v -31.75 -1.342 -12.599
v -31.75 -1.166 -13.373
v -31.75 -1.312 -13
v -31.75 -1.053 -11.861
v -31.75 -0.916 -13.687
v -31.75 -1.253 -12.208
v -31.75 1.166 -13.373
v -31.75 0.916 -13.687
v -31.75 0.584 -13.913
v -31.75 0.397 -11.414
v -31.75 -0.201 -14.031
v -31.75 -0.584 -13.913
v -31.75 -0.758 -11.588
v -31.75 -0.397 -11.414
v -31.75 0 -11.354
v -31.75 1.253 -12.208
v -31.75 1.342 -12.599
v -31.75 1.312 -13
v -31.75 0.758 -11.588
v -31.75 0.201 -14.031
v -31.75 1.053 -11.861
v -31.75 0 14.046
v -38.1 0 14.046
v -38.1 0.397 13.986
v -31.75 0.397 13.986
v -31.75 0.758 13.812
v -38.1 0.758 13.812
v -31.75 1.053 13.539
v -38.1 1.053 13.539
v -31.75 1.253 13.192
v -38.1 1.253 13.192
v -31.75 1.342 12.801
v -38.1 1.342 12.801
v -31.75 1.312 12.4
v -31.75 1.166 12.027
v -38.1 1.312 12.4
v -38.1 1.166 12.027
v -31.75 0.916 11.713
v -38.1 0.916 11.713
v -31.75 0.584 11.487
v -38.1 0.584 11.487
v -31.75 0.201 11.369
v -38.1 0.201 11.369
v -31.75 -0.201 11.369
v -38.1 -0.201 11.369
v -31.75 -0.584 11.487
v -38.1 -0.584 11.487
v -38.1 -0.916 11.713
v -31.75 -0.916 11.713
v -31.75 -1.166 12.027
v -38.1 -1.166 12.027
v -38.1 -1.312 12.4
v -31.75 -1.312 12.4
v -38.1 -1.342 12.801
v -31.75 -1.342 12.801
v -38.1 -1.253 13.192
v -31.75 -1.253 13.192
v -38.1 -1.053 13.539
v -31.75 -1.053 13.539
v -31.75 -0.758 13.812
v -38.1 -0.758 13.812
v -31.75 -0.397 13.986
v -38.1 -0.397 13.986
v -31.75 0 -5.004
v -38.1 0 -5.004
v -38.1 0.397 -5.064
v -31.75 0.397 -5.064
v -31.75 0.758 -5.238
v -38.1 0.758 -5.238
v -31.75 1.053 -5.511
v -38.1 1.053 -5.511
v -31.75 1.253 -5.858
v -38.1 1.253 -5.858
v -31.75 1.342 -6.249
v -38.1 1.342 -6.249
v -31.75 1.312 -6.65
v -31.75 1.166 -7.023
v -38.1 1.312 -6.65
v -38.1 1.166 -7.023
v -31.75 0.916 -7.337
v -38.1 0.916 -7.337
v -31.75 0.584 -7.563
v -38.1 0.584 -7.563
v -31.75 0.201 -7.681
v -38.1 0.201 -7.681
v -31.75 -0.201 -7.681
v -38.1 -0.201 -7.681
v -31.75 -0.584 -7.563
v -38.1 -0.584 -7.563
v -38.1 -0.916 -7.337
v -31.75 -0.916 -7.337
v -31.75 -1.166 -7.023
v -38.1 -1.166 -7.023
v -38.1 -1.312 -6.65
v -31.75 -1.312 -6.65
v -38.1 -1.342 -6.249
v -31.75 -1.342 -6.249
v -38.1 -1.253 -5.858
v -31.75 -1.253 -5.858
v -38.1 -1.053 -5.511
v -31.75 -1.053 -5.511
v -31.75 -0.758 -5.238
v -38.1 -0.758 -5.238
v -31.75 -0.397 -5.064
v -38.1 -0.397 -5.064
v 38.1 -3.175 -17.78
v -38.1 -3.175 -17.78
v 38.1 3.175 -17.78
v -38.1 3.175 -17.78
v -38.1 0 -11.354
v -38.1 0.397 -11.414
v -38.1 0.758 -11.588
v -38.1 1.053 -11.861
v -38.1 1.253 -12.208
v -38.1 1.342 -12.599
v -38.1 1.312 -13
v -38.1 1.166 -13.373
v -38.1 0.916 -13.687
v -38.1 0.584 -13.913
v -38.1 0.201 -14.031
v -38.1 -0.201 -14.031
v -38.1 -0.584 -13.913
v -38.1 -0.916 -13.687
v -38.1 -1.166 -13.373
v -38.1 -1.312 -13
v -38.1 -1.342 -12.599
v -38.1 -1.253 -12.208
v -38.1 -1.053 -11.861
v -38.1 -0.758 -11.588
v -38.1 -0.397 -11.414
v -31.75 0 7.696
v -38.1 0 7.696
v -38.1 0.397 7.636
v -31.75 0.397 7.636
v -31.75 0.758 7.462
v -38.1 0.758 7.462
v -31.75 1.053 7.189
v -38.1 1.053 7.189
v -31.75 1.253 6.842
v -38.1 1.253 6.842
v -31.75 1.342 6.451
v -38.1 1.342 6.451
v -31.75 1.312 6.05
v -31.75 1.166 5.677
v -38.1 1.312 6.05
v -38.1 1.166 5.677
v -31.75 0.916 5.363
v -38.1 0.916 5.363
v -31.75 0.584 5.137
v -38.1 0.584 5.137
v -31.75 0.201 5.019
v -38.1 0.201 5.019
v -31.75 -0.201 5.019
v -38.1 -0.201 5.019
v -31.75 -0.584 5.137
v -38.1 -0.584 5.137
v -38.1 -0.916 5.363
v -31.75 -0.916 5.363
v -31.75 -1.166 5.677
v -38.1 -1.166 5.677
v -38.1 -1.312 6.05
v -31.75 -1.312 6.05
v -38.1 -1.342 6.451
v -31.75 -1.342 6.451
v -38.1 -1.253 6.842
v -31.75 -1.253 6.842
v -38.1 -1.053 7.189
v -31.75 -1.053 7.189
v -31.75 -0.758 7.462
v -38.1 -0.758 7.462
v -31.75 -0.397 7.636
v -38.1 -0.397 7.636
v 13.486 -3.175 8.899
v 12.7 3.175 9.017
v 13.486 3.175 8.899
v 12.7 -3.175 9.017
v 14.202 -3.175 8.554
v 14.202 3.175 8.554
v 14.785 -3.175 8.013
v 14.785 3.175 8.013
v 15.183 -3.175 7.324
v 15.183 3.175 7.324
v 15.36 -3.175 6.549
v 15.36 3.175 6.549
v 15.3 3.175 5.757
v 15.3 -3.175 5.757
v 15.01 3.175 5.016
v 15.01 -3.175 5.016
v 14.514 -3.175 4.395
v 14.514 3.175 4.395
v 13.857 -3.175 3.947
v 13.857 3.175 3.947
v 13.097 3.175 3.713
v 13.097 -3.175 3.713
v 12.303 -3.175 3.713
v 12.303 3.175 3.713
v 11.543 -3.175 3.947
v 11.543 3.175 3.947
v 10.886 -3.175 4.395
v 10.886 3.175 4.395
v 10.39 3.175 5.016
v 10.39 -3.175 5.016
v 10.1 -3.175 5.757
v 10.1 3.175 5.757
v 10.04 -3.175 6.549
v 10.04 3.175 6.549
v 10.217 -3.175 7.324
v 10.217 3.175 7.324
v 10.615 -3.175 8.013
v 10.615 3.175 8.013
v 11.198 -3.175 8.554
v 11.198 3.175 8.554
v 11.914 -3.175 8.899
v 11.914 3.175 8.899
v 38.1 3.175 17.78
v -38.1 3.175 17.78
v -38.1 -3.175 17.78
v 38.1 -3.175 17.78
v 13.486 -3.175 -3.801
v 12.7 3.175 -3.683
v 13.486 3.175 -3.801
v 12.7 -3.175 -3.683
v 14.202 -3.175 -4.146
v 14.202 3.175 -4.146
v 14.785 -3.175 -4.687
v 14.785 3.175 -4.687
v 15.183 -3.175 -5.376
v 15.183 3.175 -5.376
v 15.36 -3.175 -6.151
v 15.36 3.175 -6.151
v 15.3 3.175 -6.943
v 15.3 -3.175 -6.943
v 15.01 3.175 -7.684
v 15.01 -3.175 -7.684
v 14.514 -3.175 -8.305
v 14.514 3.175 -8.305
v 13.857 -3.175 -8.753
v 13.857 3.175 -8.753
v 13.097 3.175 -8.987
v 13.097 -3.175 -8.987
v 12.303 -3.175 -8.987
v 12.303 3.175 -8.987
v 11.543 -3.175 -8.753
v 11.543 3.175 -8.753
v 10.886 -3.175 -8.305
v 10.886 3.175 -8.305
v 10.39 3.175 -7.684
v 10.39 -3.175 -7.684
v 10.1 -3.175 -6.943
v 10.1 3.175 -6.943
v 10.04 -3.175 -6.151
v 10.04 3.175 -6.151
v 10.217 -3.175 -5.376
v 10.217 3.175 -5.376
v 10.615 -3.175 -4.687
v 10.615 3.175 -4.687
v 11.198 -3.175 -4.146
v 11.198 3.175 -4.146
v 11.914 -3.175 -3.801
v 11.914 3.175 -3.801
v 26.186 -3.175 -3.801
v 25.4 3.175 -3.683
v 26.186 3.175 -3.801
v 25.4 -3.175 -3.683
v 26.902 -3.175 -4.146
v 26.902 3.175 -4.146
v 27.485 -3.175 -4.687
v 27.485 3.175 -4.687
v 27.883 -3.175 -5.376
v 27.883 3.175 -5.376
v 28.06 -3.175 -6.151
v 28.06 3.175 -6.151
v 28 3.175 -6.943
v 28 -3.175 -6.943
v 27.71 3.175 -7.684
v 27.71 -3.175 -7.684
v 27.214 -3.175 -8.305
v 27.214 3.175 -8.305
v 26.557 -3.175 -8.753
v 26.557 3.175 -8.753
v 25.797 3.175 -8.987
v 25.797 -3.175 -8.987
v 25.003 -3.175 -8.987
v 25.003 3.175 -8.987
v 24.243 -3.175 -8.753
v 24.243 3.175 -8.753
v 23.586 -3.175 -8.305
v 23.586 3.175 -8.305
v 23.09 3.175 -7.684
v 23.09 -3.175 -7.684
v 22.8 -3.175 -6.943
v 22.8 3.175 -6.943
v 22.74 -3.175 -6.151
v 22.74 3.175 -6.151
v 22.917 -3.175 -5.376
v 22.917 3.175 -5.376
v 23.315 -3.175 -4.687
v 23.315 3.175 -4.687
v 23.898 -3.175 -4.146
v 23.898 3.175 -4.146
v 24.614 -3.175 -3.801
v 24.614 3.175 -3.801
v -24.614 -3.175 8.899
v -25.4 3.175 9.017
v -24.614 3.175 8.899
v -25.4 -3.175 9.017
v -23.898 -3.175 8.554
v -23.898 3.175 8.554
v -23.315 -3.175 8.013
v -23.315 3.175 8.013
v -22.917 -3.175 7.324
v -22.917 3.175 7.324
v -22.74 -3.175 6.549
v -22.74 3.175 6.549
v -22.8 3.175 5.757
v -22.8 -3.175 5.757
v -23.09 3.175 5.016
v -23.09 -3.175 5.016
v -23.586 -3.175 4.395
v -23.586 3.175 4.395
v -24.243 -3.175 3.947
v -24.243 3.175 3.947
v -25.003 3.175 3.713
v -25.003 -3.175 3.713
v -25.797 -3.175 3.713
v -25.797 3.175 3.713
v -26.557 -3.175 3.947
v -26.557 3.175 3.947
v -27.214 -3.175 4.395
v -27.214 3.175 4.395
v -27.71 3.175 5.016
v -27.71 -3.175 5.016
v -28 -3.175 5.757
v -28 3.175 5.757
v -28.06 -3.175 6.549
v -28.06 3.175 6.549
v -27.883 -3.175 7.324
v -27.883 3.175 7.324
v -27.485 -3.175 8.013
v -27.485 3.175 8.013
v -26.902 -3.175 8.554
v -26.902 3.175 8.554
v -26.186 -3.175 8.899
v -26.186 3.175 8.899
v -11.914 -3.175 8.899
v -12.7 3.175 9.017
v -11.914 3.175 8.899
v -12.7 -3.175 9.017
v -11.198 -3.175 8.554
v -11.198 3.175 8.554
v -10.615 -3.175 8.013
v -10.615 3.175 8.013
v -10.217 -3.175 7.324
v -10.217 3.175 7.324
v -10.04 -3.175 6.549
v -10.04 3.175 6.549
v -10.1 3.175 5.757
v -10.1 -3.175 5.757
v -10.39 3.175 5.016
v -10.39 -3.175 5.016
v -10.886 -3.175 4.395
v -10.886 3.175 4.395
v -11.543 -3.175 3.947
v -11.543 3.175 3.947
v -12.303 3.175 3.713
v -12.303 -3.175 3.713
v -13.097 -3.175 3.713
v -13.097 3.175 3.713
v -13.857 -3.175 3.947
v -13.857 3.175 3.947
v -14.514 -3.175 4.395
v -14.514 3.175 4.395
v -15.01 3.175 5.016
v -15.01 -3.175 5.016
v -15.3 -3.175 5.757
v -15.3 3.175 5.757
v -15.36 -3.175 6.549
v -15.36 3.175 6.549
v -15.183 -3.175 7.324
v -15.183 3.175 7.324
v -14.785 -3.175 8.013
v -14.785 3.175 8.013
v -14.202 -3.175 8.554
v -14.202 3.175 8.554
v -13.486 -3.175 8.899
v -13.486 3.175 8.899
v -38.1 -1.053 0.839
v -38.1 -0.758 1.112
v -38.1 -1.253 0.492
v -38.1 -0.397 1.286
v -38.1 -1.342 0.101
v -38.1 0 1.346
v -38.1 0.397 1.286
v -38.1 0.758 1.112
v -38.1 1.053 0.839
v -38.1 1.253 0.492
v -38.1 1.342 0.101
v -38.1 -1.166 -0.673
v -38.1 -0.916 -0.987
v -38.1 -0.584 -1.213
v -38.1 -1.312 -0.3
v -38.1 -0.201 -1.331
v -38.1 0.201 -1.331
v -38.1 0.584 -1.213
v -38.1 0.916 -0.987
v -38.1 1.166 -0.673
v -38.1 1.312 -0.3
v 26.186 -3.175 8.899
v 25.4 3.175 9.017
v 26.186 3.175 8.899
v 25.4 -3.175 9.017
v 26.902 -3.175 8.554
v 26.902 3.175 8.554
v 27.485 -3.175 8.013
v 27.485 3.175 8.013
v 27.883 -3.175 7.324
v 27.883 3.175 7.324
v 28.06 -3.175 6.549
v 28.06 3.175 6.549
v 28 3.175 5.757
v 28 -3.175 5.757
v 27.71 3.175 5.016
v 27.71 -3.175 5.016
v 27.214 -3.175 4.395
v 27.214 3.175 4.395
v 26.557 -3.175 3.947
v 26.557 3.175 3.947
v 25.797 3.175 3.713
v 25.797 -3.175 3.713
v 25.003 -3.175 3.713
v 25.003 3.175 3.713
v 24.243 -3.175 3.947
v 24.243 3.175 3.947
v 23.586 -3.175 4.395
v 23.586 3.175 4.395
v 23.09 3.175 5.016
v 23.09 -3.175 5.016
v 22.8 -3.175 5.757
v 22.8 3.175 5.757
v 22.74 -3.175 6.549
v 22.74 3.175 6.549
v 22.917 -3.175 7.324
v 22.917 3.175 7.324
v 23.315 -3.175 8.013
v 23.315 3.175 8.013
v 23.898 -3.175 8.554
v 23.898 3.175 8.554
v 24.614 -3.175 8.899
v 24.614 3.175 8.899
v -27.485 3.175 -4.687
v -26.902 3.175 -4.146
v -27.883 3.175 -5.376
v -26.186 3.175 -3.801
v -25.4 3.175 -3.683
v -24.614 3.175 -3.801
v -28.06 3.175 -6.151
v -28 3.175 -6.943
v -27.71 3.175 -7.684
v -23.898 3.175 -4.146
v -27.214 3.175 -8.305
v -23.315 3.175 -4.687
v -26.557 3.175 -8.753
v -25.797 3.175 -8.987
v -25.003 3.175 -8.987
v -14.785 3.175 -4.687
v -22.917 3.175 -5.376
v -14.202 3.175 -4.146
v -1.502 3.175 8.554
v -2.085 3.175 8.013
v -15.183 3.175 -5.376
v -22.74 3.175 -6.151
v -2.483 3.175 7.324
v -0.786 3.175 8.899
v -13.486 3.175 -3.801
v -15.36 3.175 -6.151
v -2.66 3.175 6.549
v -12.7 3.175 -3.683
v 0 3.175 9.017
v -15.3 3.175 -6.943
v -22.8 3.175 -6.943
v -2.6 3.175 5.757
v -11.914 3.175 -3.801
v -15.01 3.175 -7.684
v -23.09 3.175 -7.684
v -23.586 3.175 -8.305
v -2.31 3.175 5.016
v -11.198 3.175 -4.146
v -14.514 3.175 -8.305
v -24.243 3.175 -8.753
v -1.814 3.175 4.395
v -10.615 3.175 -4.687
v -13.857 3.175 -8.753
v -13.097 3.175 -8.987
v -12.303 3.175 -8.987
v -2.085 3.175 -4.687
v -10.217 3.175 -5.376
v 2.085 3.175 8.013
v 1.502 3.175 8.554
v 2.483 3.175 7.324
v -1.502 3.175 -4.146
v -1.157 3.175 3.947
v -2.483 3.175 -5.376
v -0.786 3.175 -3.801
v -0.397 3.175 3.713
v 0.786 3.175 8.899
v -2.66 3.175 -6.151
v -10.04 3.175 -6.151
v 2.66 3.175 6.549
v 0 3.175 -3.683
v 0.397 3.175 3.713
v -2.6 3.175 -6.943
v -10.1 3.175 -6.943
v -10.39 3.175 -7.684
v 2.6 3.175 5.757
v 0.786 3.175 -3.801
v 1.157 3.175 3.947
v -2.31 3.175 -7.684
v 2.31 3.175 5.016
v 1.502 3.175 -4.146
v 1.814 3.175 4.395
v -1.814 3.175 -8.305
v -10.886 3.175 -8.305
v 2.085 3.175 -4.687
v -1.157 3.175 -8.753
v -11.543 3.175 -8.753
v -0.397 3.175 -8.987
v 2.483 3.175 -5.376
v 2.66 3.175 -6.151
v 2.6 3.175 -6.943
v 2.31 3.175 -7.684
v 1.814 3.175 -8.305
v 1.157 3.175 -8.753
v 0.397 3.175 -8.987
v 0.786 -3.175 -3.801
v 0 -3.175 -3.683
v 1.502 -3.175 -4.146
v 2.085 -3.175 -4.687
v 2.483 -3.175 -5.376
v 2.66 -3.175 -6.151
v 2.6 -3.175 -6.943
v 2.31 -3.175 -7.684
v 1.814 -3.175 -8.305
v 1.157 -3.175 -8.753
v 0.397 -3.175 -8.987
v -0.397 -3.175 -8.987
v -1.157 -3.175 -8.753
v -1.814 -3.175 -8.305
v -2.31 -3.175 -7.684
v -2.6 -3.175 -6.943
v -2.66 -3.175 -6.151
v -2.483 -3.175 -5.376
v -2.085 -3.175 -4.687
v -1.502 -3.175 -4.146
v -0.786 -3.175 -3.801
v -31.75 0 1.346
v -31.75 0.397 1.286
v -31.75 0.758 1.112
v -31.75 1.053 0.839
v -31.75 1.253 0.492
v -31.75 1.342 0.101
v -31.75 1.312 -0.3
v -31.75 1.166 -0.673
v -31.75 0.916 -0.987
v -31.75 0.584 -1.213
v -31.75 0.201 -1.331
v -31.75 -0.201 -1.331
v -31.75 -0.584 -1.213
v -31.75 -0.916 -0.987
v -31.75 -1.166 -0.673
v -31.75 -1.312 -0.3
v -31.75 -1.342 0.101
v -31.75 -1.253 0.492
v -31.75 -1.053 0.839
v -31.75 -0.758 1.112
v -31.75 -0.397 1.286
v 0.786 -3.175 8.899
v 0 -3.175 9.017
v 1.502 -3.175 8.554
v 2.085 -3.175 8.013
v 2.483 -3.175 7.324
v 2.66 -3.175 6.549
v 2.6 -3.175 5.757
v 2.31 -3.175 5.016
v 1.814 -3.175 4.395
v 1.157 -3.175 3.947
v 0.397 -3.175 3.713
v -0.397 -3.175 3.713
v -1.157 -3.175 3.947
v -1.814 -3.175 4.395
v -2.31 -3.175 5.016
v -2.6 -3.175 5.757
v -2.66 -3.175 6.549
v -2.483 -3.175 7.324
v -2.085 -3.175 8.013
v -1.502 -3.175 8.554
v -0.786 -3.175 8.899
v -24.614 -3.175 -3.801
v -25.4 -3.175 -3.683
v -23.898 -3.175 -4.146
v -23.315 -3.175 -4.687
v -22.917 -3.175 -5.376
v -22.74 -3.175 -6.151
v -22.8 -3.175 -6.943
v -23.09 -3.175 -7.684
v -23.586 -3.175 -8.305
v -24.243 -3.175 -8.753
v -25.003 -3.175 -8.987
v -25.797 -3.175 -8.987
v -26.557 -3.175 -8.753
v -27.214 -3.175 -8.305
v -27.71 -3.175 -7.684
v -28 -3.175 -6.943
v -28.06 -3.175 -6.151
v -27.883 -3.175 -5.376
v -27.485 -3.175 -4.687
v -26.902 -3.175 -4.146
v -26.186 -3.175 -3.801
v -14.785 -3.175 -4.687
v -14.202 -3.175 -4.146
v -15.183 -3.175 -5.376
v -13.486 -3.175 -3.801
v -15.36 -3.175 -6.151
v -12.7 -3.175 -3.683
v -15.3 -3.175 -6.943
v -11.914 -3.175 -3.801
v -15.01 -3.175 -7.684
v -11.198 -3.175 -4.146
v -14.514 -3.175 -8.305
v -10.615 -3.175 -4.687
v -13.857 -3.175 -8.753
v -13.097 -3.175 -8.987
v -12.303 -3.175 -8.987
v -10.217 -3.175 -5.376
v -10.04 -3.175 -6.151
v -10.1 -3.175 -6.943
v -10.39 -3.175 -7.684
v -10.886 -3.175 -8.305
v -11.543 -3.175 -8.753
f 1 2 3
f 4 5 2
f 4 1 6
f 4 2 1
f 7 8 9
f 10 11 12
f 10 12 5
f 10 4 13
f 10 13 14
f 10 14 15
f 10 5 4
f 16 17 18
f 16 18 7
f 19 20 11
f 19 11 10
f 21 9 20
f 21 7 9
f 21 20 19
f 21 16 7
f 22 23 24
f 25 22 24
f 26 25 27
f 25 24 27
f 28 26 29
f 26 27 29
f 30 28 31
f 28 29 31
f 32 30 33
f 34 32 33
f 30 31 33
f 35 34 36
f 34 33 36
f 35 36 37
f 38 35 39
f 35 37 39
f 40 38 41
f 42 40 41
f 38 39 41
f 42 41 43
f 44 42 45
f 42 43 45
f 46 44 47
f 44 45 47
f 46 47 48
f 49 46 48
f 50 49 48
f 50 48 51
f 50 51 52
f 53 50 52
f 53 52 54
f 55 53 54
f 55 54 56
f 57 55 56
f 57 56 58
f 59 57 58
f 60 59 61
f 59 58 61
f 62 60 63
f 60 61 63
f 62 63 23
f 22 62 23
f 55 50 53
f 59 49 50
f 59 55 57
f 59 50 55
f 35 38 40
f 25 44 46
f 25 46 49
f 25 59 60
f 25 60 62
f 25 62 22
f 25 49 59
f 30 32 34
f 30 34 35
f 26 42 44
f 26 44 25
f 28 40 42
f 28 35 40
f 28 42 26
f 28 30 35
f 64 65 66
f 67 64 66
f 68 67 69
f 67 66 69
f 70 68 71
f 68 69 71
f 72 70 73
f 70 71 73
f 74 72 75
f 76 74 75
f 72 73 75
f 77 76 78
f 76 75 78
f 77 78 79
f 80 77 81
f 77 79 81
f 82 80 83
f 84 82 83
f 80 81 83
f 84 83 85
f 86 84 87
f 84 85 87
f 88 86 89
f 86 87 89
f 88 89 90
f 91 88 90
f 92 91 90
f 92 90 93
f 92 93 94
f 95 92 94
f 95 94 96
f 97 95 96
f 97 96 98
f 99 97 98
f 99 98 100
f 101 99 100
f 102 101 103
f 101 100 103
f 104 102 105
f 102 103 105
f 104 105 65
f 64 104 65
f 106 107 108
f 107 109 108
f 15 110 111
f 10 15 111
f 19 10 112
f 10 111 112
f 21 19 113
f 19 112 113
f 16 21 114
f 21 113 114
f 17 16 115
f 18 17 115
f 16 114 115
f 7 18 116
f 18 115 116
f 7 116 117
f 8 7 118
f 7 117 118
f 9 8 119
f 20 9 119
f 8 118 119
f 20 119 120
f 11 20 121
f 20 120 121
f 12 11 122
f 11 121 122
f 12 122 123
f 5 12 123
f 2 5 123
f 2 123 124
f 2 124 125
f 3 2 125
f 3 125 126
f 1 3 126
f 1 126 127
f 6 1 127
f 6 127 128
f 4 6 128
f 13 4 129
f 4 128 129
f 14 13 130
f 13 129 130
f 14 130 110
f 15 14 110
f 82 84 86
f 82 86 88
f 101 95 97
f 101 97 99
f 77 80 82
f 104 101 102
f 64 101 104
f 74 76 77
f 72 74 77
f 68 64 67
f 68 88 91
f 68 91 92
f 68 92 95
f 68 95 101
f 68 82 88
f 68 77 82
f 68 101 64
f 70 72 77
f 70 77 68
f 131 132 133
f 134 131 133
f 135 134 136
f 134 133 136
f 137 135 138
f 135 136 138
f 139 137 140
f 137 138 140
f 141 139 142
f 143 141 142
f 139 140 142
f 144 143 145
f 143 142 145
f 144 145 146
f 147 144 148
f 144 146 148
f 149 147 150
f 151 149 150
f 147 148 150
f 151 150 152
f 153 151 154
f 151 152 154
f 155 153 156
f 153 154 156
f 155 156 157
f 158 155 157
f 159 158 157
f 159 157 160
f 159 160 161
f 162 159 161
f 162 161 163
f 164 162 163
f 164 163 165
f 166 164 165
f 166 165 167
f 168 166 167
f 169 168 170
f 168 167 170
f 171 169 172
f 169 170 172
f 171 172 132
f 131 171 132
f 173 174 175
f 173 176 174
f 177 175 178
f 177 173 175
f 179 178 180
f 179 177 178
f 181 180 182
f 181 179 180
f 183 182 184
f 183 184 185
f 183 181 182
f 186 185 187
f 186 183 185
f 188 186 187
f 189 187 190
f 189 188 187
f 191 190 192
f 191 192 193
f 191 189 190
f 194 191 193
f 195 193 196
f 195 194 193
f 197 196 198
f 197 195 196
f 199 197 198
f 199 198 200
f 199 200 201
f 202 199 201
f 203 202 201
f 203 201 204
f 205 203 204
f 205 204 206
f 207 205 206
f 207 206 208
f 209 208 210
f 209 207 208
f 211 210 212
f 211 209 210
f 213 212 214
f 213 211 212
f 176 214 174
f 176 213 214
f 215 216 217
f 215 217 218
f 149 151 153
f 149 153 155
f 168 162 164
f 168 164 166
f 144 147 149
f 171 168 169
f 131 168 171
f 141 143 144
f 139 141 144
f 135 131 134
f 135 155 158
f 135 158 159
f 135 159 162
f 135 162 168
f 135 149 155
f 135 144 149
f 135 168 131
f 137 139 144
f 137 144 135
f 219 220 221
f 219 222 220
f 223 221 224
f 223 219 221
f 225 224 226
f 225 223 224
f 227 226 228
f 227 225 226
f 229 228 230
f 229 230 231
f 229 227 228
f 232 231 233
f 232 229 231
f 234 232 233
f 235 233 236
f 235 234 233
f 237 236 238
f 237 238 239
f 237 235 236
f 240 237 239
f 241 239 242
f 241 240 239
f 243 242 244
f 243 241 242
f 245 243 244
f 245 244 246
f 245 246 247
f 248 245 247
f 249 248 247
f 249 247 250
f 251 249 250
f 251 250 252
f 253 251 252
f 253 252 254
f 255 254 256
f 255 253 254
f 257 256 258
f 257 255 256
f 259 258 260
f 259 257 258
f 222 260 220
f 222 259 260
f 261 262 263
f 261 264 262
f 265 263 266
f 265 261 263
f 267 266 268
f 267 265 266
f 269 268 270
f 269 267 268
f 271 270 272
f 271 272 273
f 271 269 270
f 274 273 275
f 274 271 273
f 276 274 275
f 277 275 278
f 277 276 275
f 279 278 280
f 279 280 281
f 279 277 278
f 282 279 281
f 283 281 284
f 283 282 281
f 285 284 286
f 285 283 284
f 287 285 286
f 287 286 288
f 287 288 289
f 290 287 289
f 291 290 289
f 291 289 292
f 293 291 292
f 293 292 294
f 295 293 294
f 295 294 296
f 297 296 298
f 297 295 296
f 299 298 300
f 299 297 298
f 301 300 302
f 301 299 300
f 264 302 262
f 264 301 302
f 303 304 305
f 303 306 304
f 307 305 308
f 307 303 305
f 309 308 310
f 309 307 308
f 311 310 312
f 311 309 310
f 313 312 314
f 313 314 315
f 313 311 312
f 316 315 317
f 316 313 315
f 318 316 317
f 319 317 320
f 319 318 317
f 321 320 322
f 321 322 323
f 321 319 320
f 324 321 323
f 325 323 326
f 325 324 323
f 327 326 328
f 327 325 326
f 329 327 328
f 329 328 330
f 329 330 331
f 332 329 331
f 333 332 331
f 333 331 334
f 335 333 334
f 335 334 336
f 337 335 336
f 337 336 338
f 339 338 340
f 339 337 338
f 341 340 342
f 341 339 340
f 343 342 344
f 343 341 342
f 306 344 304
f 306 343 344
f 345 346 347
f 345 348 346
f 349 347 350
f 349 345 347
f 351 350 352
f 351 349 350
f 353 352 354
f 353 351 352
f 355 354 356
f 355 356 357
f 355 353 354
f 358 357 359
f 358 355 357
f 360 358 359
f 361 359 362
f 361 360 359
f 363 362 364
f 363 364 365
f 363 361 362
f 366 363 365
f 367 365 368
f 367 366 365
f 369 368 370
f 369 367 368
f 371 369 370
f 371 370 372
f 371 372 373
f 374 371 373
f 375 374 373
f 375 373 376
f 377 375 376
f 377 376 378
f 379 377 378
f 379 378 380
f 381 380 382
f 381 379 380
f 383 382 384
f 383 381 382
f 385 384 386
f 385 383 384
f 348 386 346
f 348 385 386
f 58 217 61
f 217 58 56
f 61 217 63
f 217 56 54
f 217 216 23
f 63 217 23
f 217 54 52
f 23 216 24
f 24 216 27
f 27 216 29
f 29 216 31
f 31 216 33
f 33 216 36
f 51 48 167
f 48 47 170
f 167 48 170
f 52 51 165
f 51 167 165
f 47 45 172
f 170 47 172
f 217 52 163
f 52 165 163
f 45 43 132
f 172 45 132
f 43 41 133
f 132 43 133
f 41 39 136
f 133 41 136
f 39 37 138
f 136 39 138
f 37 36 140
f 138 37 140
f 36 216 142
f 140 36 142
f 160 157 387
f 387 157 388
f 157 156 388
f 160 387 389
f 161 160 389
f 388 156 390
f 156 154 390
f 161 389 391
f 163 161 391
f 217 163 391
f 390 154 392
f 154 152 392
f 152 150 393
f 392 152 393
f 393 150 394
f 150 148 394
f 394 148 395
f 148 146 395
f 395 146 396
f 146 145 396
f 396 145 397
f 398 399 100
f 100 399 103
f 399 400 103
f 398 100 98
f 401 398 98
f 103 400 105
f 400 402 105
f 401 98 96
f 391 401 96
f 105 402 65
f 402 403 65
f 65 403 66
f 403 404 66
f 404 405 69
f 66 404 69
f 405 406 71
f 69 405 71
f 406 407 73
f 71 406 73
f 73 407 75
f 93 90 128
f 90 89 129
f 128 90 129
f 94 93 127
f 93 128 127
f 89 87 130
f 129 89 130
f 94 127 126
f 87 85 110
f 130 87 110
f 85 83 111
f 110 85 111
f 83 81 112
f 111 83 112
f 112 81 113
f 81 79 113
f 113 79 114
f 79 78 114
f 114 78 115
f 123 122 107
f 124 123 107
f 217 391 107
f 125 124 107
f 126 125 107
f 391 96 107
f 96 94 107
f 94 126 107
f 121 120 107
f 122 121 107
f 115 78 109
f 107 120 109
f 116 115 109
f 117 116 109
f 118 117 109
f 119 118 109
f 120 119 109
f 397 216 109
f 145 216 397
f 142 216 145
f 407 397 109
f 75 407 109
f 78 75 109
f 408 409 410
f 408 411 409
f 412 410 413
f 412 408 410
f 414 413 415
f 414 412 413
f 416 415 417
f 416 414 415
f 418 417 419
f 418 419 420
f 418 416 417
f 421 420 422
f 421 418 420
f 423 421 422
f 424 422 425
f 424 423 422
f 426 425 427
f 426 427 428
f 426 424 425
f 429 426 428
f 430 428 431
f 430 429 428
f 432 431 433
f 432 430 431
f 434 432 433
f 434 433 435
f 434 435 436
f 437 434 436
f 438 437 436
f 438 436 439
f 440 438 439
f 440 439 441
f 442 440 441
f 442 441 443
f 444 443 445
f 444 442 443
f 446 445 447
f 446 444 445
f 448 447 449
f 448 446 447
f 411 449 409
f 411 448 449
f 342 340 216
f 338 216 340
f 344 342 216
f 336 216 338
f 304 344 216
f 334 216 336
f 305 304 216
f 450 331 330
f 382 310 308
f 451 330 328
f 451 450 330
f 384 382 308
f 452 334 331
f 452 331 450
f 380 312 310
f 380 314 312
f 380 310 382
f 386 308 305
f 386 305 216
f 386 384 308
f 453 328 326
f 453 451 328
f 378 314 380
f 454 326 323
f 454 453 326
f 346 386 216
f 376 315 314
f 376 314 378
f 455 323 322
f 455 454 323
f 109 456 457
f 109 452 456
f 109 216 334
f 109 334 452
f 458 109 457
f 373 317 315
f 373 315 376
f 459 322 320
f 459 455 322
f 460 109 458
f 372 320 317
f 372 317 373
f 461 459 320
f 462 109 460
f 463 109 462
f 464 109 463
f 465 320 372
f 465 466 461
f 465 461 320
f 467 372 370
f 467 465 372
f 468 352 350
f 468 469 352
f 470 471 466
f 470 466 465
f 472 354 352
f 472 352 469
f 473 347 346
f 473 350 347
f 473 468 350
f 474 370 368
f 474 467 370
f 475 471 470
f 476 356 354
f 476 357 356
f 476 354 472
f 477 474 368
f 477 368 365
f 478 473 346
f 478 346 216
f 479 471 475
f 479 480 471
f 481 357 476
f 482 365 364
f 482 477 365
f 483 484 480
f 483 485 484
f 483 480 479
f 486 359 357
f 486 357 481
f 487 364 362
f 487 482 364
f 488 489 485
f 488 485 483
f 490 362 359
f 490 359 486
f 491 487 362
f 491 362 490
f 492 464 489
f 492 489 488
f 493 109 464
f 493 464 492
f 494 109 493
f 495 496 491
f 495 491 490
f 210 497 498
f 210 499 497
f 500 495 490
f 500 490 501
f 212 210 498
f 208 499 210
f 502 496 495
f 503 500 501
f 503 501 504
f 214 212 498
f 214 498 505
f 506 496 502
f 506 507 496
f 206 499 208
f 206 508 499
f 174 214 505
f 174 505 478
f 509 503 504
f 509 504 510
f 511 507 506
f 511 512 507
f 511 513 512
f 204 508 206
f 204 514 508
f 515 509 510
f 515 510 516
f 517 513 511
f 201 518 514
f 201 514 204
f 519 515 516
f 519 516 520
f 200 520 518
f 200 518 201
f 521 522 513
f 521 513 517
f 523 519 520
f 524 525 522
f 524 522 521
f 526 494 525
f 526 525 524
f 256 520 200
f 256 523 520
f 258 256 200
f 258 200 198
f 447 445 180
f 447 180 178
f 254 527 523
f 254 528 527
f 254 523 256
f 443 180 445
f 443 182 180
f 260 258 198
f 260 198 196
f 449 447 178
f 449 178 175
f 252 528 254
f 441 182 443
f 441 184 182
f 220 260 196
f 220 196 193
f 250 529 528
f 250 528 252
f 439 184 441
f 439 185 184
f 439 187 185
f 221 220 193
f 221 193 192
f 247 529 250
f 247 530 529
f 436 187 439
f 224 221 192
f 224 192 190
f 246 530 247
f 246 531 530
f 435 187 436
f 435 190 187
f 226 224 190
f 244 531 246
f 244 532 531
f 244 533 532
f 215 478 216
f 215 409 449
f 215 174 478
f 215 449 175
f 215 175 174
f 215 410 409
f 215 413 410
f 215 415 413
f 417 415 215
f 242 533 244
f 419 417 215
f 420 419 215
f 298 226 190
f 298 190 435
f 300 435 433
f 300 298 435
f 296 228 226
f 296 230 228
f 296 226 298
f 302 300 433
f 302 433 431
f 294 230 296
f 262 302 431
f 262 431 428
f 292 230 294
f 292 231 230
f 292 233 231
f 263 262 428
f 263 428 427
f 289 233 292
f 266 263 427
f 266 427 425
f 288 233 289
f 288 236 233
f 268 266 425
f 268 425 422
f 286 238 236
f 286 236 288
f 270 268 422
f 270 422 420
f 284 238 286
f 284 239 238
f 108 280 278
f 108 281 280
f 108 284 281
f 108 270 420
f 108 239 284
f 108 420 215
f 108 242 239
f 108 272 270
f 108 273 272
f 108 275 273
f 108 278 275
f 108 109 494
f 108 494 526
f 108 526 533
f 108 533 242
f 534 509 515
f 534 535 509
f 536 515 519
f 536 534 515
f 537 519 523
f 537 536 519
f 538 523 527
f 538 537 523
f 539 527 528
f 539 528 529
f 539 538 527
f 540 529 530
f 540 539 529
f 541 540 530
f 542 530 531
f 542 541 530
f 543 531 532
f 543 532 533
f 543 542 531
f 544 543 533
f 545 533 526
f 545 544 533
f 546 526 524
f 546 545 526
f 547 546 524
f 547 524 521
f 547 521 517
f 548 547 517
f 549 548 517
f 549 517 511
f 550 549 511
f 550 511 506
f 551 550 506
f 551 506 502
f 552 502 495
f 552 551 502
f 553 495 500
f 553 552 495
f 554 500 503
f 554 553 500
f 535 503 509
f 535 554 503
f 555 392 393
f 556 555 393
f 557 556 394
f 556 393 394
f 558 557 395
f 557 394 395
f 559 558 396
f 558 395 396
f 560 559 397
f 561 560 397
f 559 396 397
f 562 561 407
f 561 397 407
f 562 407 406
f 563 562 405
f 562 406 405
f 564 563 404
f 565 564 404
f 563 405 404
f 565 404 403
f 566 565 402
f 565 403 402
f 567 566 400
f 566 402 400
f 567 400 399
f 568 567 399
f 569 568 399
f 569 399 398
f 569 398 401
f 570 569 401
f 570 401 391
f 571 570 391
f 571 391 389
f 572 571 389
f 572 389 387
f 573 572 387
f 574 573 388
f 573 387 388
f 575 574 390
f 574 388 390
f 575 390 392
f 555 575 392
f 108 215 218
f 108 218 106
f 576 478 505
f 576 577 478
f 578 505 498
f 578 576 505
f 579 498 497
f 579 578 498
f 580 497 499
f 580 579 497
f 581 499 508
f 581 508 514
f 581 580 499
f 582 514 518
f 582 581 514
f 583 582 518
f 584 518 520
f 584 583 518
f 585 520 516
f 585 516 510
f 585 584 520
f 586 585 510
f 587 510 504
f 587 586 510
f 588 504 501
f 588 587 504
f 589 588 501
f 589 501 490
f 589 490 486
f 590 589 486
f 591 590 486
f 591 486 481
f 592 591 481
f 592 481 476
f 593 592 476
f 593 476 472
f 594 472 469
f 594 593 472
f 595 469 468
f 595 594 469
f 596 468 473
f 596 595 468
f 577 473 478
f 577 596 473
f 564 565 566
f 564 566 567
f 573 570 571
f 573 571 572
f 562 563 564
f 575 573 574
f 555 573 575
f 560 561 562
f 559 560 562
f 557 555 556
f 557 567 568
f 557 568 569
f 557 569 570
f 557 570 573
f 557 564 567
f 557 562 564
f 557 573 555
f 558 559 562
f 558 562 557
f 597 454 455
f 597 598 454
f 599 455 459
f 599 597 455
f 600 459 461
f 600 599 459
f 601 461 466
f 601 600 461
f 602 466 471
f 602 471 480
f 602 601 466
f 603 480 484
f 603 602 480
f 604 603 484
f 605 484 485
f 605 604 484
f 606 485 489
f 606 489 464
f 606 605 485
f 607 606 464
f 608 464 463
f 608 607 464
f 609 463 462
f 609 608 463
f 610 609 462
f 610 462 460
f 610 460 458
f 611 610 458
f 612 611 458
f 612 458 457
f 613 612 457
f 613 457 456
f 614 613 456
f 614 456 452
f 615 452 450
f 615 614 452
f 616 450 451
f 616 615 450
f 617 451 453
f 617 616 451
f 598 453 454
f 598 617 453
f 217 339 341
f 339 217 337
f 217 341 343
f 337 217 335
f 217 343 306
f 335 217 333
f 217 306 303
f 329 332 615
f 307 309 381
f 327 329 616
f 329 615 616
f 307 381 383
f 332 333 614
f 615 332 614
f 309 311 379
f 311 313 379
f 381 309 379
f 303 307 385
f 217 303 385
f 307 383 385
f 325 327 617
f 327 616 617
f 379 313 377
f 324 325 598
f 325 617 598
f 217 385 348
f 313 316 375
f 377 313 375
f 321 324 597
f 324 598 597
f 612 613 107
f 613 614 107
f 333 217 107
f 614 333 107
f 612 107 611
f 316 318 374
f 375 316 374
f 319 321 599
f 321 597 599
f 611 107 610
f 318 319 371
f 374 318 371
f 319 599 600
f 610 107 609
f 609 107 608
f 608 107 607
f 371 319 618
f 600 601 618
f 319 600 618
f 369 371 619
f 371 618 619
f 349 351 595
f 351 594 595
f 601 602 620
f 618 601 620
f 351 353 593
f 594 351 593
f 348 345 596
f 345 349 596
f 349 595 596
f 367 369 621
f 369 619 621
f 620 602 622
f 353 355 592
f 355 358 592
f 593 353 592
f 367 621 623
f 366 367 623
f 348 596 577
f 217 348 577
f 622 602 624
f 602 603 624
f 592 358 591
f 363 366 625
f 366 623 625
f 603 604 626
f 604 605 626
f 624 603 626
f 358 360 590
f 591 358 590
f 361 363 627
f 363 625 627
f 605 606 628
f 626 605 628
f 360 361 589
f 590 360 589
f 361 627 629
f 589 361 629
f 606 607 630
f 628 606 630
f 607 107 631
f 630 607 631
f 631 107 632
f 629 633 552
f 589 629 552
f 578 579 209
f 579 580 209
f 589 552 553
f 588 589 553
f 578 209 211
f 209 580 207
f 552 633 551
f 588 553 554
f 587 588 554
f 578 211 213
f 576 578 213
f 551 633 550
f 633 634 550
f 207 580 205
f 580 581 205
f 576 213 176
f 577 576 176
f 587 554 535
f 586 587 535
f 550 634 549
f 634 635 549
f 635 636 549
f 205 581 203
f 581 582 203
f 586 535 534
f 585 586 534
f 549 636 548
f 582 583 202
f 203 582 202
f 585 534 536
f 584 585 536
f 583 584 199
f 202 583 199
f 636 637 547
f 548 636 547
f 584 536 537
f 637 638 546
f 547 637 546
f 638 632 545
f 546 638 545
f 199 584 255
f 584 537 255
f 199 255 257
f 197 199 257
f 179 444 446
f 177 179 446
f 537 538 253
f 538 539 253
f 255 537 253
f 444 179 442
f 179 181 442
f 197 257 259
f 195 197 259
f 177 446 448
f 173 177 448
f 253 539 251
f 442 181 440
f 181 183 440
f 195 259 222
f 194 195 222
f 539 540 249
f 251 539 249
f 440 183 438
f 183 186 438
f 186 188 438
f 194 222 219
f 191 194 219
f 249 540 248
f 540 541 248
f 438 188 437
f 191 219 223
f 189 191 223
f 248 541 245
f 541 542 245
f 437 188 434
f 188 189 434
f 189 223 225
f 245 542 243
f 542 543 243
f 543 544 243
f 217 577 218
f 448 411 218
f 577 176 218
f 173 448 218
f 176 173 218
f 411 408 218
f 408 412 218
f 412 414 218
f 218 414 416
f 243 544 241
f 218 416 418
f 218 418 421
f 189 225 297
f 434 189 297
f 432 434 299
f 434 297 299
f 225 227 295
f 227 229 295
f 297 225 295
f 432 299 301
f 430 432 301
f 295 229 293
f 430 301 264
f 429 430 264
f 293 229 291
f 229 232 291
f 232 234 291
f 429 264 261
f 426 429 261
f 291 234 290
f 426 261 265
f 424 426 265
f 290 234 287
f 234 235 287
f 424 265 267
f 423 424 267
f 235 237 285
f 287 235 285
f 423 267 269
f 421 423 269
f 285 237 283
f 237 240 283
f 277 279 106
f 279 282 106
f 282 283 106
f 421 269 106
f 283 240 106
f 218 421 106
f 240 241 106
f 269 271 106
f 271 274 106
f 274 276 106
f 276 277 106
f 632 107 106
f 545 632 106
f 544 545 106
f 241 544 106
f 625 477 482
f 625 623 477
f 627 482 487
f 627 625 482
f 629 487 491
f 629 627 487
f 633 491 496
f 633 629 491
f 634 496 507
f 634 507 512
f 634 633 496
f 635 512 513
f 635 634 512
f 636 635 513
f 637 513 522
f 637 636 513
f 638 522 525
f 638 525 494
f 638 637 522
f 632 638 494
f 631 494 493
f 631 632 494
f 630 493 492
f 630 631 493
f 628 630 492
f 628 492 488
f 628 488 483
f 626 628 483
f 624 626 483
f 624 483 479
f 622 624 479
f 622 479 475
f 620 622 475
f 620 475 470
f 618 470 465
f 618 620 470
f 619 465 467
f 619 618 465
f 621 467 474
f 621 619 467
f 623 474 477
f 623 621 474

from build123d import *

# Parameters (mm, degrees)
SKETCH1_W           = 76.2
SKETCH1_H           = 35.56
SKETCH1_R           = 2.667
BOSS_EXTRUDE1_DEPTH = 3.175
SKETCH2_R           = 1.3462
CUT_EXTRUDE1_DEPTH  = 6.35


with BuildPart() as part:
    # Sketch1 → Boss-Extrude1 (new, symmetric)
    with BuildSketch(Plane(origin=(0, 0, 0), x_dir=(1, 0, 0), z_dir=(0, 1, 0))):
        Rectangle(SKETCH1_W, SKETCH1_H)
        with Locations(Location((-25.4, 6.35, 0), (0, 0, 270))):
            Circle(SKETCH1_R, mode=Mode.SUBTRACT)
        with Locations(Location((-12.7, 6.35, 0), (0, 0, 270))):
            Circle(SKETCH1_R, mode=Mode.SUBTRACT)
        with Locations(Location((0, 6.35, 0), (0, 0, 270))):
            Circle(SKETCH1_R, mode=Mode.SUBTRACT)
        with Locations(Location((12.7, 6.35, 0), (0, 0, 270))):
            Circle(SKETCH1_R, mode=Mode.SUBTRACT)
        with Locations(Location((25.4, 6.35, 0), (0, 0, 270))):
            Circle(SKETCH1_R, mode=Mode.SUBTRACT)
        with Locations(Location((-12.7, -6.35, 0), (0, 0, 270))):
            Circle(SKETCH1_R, mode=Mode.SUBTRACT)
        with Locations(Location((0, -6.35, 0), (0, 0, 270))):
            Circle(SKETCH1_R, mode=Mode.SUBTRACT)
        with Locations(Location((12.7, -6.35, 0), (0, 0, 270))):
            Circle(SKETCH1_R, mode=Mode.SUBTRACT)
        with Locations(Location((25.4, -6.35, 0), (0, 0, 270))):
            Circle(SKETCH1_R, mode=Mode.SUBTRACT)
        with Locations(Location((-25.4, -6.35, 0), (0, 0, 270))):
            Circle(SKETCH1_R, mode=Mode.SUBTRACT)
    extrude(amount=BOSS_EXTRUDE1_DEPTH, both=True)

    # Sketch2 → Cut-Extrude1 (cut)
    with BuildSketch(Plane.ZY.offset(38.1)):
        with Locations((-12.7, 0)):
            Circle(SKETCH2_R)
        with Locations((-6.35, 0)):
            Circle(SKETCH2_R)
        Circle(SKETCH2_R)
        with Locations((6.35, 0)):
            Circle(SKETCH2_R)
        with Locations((12.7, 0)):
            Circle(SKETCH2_R)
    extrude(amount=-CUT_EXTRUDE1_DEPTH, mode=Mode.SUBTRACT)


solid = part.part
